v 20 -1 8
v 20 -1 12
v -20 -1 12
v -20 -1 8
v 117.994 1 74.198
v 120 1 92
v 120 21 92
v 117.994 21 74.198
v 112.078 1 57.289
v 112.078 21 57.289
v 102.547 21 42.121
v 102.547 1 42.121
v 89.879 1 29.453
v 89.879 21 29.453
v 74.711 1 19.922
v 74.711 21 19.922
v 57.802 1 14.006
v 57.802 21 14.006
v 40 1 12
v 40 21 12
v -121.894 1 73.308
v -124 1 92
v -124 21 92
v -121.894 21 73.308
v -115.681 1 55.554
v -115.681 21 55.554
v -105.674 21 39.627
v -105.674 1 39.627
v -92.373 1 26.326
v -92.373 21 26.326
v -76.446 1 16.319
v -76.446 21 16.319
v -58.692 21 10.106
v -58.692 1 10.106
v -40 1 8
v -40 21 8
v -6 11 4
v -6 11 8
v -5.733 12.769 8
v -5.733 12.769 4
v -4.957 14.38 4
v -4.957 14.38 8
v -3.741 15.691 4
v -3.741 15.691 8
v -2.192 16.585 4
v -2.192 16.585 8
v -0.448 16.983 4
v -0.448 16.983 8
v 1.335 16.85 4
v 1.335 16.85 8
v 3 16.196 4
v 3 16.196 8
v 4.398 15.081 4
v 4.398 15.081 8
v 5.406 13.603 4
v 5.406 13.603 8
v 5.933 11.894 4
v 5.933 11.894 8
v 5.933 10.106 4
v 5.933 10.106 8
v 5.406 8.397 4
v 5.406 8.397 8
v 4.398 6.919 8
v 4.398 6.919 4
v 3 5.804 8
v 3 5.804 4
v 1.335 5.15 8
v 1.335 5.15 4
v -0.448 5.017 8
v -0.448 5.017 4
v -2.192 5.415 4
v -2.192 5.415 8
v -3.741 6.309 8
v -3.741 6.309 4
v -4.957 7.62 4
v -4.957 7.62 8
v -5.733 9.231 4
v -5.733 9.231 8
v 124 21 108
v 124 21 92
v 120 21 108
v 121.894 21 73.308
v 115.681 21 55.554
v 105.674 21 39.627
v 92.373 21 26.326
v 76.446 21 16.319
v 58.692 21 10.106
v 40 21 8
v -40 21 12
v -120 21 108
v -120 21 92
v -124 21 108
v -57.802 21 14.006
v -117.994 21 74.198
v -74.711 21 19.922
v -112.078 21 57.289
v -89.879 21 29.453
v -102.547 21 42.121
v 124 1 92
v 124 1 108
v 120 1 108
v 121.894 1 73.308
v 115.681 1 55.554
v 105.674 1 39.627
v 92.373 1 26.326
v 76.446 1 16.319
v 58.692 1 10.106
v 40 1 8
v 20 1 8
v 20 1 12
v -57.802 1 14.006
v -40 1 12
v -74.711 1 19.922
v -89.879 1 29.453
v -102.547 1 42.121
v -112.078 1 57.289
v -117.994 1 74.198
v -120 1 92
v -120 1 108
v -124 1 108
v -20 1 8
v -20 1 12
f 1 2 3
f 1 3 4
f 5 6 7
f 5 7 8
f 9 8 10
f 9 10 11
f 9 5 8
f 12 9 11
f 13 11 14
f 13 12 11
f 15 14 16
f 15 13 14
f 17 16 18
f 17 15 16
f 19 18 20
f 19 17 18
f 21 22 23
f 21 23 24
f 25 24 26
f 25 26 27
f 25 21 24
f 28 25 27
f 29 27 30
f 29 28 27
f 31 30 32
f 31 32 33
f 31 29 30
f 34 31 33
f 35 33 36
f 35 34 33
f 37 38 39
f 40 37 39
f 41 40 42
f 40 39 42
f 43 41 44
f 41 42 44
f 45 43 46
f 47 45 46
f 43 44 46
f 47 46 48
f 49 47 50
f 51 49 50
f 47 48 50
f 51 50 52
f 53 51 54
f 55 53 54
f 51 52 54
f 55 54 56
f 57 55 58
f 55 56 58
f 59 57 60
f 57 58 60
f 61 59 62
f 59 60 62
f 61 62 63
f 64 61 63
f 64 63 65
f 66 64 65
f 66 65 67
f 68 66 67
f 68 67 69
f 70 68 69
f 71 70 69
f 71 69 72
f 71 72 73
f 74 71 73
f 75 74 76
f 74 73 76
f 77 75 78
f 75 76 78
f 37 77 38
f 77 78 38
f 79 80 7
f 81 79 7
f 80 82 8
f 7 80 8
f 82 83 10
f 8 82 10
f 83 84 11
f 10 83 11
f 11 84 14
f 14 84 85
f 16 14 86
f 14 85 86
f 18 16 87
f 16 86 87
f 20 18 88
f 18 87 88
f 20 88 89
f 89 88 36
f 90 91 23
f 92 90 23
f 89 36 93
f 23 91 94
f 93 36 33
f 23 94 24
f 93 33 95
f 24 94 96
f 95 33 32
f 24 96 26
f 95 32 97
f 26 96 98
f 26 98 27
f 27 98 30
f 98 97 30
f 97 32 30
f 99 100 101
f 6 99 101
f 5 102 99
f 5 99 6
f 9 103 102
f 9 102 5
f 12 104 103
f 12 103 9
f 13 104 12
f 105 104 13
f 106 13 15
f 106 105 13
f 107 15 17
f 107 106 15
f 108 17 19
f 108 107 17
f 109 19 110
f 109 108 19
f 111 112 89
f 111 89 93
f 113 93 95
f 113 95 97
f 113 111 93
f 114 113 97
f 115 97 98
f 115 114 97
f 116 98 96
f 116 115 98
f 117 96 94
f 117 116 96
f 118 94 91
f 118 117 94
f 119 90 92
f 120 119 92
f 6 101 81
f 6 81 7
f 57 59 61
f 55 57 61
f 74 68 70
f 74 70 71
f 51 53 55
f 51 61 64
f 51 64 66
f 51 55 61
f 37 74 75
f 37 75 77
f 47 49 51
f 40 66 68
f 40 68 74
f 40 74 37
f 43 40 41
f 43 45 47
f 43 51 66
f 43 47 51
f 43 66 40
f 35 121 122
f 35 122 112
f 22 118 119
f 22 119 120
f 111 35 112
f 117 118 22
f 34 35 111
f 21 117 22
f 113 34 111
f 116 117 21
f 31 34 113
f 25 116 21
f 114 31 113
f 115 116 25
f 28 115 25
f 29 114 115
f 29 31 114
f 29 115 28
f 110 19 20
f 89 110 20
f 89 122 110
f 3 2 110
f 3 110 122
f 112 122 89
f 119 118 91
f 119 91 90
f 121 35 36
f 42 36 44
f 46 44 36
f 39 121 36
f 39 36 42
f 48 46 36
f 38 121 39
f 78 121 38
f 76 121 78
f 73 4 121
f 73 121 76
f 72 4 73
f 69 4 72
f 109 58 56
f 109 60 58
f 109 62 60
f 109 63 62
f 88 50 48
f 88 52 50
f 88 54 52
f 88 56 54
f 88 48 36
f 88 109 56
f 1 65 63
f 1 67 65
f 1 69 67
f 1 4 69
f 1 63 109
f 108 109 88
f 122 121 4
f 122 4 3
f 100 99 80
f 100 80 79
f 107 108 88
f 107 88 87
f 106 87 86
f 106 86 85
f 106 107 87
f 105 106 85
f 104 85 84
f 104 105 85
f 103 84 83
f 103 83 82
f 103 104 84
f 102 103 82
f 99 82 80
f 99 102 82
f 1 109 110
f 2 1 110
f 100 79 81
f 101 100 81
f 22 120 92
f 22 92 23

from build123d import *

# Parameters (mm, degrees)
EXTRUDE_1_DEPTH = 20
EXTRUDE_4_DEPTH = 20
SKETCH_10_R     = 6
EXTRUDE_5_DEPTH = 4


with BuildPart() as part:
    # 草图2 → 凸台-拉伸1 (new body, symmetric)
    with BuildSketch(Plane(origin=(0, 0, 0), x_dir=(0, 0, -1), z_dir=(1, 0, 0))):
        Polygon((-10, 1), (-8, 1), (-8, -1), (-10, -1), (-12, -1), (-12, 1), align=None)
    extrude(amount=EXTRUDE_1_DEPTH, both=True)

    # 草图9 → 凸台-拉伸4 (add)
    with BuildSketch(Plane(origin=(0, 1, 0), x_dir=(1, 0, 0), z_dir=(0, 1, 0))):
        with BuildLine():
            Line((-40, -8), (40, -8))
            ThreePointArc((40, -8), (99.39696962, -32.60303038), (124, -92))
            Line((124, -92), (124, -108))
            Line((124, -108), (120, -108))
            Line((120, -108), (120, -92))
            ThreePointArc((120, -92), (96.568542495, -35.431457505), (40, -12))
            Line((40, -12), (-40, -12))
            ThreePointArc((-40, -12), (-96.568542495, -35.431457505), (-120, -92))
            Line((-120, -92), (-120, -108))
            Line((-120, -108), (-124, -108))
            Line((-124, -108), (-124, -92))
            ThreePointArc((-124, -92), (-99.39696962, -32.60303038), (-40, -8))
        make_face()
    extrude(amount=EXTRUDE_4_DEPTH)

    # 草图10 → 凸台-拉伸5 (add)
    with BuildSketch(Plane(origin=(0, 0, 8), x_dir=(-1, 0, 0), z_dir=(0, 0, -1))):
        with Locations((0, 11)):
            Circle(SKETCH_10_R)
    extrude(amount=EXTRUDE_5_DEPTH)


solid = part.part
